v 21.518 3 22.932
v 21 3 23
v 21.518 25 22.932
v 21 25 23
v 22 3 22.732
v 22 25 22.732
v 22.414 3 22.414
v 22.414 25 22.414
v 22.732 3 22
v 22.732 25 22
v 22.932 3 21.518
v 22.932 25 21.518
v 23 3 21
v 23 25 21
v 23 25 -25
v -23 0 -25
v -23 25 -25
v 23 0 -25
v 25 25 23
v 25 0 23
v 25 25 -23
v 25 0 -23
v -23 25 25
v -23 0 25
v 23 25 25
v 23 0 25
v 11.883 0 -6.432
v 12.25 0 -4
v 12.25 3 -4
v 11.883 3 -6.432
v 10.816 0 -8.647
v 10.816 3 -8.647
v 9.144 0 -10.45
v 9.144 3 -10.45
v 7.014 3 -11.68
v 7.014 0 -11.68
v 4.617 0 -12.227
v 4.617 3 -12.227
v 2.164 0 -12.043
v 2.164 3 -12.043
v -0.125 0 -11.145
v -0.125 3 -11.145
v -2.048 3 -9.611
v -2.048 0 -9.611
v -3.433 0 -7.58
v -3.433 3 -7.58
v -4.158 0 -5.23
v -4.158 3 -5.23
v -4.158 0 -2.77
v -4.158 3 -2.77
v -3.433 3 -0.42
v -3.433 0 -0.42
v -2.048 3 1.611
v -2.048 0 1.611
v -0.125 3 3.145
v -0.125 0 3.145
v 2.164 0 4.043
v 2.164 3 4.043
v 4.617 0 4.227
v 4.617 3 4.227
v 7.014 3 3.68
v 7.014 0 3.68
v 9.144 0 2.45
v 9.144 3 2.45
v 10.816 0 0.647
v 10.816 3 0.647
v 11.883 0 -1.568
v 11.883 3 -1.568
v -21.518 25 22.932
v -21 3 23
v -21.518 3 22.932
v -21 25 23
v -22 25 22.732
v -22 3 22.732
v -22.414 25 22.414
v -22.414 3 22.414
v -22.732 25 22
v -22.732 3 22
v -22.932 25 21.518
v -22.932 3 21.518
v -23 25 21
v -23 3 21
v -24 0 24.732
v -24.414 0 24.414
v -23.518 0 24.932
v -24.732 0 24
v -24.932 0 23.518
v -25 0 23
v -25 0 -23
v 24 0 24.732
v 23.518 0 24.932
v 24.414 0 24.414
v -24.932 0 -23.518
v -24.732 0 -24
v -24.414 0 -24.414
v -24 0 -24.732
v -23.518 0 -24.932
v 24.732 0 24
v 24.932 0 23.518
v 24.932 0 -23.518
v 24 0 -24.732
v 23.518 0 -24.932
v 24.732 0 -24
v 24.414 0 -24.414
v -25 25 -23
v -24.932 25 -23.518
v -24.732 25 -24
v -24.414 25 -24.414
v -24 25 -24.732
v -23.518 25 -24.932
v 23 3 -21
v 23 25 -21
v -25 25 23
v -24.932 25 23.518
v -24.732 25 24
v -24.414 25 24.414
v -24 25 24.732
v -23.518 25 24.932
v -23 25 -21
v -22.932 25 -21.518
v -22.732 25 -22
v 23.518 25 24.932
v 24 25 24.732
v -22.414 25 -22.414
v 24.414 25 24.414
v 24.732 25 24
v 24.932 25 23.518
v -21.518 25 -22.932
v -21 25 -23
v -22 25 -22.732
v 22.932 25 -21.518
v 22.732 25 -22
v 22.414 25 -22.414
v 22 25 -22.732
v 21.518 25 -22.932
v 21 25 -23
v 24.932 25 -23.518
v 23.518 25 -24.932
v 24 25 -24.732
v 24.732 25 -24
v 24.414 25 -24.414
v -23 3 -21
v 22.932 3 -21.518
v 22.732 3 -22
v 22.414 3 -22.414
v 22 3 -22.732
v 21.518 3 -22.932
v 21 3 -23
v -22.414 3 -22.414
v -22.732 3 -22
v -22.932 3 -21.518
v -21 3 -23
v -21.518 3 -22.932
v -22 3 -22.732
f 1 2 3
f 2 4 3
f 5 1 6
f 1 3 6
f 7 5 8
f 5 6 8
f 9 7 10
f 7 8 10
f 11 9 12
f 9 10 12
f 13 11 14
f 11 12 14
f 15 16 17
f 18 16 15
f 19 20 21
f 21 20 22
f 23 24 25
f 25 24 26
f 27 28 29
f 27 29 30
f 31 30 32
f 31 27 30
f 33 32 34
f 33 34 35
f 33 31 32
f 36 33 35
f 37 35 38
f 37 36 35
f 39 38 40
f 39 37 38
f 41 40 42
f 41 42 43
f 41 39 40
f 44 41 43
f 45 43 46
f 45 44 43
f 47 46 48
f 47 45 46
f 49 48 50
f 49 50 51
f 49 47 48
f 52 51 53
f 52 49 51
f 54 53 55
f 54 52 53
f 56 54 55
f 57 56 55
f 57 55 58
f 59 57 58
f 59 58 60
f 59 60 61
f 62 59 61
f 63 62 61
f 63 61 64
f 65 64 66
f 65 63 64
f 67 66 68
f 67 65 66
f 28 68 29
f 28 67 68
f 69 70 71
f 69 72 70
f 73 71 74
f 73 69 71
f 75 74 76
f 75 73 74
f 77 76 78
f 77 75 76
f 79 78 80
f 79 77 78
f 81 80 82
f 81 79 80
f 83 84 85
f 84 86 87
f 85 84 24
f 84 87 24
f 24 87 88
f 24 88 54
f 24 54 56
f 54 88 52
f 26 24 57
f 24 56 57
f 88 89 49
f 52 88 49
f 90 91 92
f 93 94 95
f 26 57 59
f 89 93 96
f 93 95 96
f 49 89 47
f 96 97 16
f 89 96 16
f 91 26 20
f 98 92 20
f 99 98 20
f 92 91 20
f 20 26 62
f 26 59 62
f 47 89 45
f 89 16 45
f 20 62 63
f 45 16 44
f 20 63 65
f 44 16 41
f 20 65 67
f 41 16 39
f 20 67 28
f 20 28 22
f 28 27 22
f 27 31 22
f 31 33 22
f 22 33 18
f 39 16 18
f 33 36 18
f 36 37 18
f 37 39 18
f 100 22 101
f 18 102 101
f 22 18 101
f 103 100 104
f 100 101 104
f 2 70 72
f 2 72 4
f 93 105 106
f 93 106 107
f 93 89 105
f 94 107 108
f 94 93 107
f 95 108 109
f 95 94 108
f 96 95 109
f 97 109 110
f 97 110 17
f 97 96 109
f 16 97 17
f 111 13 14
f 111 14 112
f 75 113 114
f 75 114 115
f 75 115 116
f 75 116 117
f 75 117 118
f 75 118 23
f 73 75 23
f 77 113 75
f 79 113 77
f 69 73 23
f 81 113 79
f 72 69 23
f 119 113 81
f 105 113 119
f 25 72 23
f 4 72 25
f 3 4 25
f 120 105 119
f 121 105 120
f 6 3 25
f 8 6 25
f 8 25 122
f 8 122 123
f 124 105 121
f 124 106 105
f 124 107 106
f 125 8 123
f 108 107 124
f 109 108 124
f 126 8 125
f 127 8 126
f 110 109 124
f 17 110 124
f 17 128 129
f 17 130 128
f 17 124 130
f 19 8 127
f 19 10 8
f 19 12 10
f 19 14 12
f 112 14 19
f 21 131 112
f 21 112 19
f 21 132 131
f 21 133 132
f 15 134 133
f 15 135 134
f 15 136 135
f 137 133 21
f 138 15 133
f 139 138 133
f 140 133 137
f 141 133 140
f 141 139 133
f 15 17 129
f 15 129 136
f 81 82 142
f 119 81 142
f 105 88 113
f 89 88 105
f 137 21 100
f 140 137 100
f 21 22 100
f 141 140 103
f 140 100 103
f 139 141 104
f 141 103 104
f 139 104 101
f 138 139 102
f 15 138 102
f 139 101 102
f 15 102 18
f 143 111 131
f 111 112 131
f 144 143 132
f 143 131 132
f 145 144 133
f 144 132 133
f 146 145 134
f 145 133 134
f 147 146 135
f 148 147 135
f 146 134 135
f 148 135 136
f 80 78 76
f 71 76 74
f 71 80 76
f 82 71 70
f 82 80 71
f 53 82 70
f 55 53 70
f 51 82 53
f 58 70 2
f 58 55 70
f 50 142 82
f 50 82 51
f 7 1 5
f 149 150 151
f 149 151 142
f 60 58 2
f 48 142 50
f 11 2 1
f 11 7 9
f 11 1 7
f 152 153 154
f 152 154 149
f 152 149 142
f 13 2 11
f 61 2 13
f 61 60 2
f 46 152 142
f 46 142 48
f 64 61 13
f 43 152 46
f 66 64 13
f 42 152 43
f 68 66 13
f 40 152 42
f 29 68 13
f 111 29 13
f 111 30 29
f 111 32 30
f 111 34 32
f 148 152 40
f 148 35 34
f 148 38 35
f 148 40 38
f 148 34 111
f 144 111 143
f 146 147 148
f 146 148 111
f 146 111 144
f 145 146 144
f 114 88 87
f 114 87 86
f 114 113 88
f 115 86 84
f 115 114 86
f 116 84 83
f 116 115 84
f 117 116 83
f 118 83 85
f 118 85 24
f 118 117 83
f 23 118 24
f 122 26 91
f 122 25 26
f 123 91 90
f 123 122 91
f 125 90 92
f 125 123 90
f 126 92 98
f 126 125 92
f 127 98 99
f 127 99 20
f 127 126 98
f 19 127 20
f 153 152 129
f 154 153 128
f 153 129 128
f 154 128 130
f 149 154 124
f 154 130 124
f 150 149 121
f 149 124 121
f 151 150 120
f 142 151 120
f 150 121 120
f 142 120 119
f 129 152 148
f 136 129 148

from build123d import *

# Parameters (mm, degrees)
SZKIC3_W                    = 50
SZKIC3_H                    = 50
SZKIC3_R                    = 18
SZKIC3_R_2                  = 8.25
DODANIE_WYCI_GNI_CIE2_DEPTH = 3
SZKIC4_W                    = 50
SZKIC4_H                    = 50
SZKIC4_W_2                  = 46
SZKIC4_H_2                  = 46
DODANIE_WYCI_GNI_CIE3_DEPTH = 22
ZAOKR_GLENIE1_R             = 2


with BuildPart() as part:
    # Szkic3 → Dodanie-wyciągnięcie2 (new body)
    with BuildSketch(Plane(origin=(0, 0, 0), x_dir=(1, 0, 0), z_dir=(0, 1, 0))):
        Rectangle(SZKIC3_W, SZKIC3_H)
        with Locations((4, 4)):
            Circle(SZKIC3_R, mode=Mode.SUBTRACT)
        with Locations((4, 4)):
            Circle(SZKIC3_R)
        with Locations((4, 4)):
            Circle(SZKIC3_R_2, mode=Mode.SUBTRACT)
    extrude(amount=DODANIE_WYCI_GNI_CIE2_DEPTH)

    # Szkic4 → Dodanie-wyciągnięcie3 (add)
    with BuildSketch(Plane(origin=(0, 3, 0), x_dir=(1, 0, 0), z_dir=(0, 1, 0))):
        Rectangle(SZKIC4_W, SZKIC4_H)
        Rectangle(SZKIC4_W_2, SZKIC4_H_2, mode=Mode.SUBTRACT)
    extrude(amount=DODANIE_WYCI_GNI_CIE3_DEPTH)

    # Zaokrąglenie1
    zaokr_glenie1_edges = [part.edges().sort_by_distance(p)[0] for p in [
        (-25, 12.5, 25),
        (-25, 12.5, -25),
        (25, 12.5, -25),
        (25, 12.5, 25),
        (23, 14, -23),
        (-23, 14, -23),
        (-23, 14, 23),
        (23, 14, 23),
    ]]
    fillet(zaokr_glenie1_edges, radius=ZAOKR_GLENIE1_R)


solid = part.part
